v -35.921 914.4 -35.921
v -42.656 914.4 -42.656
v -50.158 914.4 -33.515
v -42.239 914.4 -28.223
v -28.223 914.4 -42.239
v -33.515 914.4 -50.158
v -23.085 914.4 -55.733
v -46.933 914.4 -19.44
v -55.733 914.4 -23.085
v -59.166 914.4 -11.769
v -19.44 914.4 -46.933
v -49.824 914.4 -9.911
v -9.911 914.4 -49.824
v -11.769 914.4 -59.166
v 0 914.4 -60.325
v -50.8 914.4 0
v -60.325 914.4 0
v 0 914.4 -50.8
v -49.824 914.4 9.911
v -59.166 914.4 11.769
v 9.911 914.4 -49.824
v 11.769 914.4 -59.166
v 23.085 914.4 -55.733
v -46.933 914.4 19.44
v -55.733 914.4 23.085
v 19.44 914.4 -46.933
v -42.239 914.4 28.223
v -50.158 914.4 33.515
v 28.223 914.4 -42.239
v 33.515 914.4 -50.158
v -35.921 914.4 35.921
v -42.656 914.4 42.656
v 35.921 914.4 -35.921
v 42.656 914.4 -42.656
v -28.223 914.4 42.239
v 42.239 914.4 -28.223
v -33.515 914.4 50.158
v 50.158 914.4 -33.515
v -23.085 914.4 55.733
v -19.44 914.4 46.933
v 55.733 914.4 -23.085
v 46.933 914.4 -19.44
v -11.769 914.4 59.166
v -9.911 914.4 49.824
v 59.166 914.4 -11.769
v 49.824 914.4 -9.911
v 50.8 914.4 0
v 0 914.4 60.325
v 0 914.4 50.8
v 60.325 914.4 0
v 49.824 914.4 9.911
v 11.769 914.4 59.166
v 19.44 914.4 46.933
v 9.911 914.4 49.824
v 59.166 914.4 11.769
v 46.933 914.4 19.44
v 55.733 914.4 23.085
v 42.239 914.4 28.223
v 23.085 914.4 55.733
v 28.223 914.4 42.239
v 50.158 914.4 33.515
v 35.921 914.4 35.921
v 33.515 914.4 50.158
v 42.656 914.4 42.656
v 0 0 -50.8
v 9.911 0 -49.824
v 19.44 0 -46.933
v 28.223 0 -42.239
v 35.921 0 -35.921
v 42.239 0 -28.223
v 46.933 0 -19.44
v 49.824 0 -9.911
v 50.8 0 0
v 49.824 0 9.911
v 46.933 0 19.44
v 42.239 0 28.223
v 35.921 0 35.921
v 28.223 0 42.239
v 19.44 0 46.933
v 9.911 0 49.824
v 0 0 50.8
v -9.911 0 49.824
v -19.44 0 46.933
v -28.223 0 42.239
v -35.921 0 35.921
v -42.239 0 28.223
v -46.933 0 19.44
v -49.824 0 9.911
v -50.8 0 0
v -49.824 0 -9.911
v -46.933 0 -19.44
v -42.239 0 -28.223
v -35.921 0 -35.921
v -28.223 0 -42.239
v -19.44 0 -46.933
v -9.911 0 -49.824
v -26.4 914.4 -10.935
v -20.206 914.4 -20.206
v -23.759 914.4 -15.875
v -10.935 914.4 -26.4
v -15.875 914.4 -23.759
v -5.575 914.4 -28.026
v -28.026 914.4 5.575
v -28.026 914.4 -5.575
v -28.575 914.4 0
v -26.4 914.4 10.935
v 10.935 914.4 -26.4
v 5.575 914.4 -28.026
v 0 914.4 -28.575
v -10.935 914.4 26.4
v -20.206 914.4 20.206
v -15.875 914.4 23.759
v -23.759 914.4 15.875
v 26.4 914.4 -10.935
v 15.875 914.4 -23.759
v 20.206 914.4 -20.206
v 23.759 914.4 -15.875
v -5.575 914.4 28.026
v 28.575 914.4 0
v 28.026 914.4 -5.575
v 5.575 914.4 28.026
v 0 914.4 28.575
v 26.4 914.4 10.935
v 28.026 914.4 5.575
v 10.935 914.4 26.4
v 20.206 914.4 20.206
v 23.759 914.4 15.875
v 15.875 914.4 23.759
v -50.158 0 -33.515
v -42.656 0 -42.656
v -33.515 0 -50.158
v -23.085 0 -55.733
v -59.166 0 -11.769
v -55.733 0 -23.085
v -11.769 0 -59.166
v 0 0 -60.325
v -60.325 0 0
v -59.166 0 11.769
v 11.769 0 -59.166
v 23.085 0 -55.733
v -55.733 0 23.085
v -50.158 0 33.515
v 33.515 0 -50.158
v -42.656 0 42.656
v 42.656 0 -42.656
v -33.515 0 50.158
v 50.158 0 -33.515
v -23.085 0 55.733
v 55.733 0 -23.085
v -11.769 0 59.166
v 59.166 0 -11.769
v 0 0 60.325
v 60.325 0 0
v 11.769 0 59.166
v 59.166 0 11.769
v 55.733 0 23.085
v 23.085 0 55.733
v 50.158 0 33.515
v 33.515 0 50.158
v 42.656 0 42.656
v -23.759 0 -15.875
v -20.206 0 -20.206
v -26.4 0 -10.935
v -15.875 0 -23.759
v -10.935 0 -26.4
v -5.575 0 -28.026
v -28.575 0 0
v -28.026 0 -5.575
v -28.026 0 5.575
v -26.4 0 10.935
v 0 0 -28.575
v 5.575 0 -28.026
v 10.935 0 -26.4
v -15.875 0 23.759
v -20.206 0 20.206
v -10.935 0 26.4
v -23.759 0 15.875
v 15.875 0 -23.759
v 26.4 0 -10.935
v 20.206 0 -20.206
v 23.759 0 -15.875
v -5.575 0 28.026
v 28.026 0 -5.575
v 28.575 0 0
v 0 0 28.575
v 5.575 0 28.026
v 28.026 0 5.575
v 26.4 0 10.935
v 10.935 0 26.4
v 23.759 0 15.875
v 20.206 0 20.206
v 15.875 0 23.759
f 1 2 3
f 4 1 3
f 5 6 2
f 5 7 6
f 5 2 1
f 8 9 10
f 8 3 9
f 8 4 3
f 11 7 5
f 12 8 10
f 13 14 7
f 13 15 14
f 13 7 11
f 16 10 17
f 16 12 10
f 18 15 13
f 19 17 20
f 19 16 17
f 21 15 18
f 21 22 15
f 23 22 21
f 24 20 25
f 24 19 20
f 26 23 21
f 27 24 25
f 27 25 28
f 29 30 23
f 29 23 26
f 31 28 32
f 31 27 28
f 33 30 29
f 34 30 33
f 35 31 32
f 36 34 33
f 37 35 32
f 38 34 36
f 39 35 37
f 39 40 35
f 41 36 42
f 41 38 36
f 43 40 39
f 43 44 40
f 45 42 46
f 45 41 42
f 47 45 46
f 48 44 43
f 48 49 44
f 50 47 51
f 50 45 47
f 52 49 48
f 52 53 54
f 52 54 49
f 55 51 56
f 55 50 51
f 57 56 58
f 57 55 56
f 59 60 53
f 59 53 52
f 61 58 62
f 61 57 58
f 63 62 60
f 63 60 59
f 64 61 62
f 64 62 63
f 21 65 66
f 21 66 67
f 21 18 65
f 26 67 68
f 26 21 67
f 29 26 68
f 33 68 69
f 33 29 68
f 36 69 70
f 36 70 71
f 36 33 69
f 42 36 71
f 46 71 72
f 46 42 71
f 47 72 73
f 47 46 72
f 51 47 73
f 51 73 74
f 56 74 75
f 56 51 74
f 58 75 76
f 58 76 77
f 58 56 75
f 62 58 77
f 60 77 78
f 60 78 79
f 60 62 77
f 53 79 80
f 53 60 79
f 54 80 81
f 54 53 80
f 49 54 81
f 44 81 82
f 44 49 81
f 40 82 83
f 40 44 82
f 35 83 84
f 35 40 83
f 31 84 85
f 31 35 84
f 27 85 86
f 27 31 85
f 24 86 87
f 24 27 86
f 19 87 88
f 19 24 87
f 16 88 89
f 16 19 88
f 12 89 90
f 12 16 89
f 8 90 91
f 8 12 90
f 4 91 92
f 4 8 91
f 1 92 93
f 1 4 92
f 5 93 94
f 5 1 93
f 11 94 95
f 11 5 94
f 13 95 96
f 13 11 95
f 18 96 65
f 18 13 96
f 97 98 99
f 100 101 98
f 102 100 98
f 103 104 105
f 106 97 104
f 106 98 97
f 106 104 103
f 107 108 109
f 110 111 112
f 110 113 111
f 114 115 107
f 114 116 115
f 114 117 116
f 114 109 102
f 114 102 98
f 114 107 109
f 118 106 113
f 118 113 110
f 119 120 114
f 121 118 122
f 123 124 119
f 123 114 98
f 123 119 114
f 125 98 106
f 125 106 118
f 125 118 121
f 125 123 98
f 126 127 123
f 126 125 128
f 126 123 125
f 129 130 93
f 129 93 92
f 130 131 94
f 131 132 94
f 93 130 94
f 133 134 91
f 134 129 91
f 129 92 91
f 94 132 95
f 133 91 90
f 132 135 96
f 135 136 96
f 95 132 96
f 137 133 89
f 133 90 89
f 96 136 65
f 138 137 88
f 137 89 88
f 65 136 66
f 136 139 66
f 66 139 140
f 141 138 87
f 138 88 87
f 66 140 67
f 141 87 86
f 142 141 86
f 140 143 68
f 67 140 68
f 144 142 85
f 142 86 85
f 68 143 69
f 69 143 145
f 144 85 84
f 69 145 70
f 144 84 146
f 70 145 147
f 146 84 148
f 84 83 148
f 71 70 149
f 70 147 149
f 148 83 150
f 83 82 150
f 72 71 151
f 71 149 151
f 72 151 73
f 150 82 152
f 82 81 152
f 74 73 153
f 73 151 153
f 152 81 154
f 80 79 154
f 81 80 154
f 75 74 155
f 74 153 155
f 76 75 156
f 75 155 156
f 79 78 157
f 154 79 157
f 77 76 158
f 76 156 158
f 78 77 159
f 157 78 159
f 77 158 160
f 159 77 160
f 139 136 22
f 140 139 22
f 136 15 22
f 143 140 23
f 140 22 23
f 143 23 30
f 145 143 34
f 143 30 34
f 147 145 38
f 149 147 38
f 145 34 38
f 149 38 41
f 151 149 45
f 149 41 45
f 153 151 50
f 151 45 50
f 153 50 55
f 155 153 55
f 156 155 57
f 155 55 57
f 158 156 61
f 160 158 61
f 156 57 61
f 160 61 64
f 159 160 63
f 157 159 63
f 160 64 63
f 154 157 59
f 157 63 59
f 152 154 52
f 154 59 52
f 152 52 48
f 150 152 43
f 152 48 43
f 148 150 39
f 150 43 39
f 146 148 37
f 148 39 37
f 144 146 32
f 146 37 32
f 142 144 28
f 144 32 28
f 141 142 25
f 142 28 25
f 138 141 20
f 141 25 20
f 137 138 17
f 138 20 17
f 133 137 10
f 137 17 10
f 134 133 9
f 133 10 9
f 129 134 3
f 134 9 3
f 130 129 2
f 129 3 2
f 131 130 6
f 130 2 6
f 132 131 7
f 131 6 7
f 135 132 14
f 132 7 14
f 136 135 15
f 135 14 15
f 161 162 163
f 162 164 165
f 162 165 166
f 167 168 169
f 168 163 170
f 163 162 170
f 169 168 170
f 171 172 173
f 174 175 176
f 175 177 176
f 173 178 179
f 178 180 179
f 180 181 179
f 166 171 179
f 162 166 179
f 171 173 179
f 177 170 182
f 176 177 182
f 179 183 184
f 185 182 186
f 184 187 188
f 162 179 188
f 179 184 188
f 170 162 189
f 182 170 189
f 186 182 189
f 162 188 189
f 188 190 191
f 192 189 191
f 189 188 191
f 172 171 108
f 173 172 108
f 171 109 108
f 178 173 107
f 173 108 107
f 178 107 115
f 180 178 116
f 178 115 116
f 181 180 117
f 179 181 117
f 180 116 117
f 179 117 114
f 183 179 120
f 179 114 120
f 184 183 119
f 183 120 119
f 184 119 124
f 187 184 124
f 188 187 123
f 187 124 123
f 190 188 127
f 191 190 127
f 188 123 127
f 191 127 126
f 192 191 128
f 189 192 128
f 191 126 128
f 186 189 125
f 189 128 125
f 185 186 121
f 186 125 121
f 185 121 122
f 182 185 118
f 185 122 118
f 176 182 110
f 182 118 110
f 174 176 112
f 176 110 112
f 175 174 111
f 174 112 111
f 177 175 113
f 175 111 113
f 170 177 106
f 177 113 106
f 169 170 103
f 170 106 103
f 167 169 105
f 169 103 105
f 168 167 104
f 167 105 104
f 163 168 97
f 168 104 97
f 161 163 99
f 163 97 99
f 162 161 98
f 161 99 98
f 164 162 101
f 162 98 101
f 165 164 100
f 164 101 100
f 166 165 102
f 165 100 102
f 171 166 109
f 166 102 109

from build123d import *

# Parameters (mm, degrees)
SKETCH1_W   = 28.575
SKETCH1_H   = 914.4
SKETCH1_W_2 = 9.525


with BuildPart() as part:
    # Sketch1 → Revolve1 (revolve)
    with BuildSketch(Plane.XY, mode=Mode.PRIVATE) as revolve1_sk:
        with Locations((14.2875, 457.2)):
            Rectangle(SKETCH1_W, SKETCH1_H)
        with Locations((55.5625, 457.2)):
            Rectangle(SKETCH1_W_2, SKETCH1_H)
    revolve(revolve1_sk.sketch.rotate(Axis((0, 0, 0), (0, -1, 0)), 270), axis=Axis((0, 0, 0), (0, -1, 0)))


solid = part.part
